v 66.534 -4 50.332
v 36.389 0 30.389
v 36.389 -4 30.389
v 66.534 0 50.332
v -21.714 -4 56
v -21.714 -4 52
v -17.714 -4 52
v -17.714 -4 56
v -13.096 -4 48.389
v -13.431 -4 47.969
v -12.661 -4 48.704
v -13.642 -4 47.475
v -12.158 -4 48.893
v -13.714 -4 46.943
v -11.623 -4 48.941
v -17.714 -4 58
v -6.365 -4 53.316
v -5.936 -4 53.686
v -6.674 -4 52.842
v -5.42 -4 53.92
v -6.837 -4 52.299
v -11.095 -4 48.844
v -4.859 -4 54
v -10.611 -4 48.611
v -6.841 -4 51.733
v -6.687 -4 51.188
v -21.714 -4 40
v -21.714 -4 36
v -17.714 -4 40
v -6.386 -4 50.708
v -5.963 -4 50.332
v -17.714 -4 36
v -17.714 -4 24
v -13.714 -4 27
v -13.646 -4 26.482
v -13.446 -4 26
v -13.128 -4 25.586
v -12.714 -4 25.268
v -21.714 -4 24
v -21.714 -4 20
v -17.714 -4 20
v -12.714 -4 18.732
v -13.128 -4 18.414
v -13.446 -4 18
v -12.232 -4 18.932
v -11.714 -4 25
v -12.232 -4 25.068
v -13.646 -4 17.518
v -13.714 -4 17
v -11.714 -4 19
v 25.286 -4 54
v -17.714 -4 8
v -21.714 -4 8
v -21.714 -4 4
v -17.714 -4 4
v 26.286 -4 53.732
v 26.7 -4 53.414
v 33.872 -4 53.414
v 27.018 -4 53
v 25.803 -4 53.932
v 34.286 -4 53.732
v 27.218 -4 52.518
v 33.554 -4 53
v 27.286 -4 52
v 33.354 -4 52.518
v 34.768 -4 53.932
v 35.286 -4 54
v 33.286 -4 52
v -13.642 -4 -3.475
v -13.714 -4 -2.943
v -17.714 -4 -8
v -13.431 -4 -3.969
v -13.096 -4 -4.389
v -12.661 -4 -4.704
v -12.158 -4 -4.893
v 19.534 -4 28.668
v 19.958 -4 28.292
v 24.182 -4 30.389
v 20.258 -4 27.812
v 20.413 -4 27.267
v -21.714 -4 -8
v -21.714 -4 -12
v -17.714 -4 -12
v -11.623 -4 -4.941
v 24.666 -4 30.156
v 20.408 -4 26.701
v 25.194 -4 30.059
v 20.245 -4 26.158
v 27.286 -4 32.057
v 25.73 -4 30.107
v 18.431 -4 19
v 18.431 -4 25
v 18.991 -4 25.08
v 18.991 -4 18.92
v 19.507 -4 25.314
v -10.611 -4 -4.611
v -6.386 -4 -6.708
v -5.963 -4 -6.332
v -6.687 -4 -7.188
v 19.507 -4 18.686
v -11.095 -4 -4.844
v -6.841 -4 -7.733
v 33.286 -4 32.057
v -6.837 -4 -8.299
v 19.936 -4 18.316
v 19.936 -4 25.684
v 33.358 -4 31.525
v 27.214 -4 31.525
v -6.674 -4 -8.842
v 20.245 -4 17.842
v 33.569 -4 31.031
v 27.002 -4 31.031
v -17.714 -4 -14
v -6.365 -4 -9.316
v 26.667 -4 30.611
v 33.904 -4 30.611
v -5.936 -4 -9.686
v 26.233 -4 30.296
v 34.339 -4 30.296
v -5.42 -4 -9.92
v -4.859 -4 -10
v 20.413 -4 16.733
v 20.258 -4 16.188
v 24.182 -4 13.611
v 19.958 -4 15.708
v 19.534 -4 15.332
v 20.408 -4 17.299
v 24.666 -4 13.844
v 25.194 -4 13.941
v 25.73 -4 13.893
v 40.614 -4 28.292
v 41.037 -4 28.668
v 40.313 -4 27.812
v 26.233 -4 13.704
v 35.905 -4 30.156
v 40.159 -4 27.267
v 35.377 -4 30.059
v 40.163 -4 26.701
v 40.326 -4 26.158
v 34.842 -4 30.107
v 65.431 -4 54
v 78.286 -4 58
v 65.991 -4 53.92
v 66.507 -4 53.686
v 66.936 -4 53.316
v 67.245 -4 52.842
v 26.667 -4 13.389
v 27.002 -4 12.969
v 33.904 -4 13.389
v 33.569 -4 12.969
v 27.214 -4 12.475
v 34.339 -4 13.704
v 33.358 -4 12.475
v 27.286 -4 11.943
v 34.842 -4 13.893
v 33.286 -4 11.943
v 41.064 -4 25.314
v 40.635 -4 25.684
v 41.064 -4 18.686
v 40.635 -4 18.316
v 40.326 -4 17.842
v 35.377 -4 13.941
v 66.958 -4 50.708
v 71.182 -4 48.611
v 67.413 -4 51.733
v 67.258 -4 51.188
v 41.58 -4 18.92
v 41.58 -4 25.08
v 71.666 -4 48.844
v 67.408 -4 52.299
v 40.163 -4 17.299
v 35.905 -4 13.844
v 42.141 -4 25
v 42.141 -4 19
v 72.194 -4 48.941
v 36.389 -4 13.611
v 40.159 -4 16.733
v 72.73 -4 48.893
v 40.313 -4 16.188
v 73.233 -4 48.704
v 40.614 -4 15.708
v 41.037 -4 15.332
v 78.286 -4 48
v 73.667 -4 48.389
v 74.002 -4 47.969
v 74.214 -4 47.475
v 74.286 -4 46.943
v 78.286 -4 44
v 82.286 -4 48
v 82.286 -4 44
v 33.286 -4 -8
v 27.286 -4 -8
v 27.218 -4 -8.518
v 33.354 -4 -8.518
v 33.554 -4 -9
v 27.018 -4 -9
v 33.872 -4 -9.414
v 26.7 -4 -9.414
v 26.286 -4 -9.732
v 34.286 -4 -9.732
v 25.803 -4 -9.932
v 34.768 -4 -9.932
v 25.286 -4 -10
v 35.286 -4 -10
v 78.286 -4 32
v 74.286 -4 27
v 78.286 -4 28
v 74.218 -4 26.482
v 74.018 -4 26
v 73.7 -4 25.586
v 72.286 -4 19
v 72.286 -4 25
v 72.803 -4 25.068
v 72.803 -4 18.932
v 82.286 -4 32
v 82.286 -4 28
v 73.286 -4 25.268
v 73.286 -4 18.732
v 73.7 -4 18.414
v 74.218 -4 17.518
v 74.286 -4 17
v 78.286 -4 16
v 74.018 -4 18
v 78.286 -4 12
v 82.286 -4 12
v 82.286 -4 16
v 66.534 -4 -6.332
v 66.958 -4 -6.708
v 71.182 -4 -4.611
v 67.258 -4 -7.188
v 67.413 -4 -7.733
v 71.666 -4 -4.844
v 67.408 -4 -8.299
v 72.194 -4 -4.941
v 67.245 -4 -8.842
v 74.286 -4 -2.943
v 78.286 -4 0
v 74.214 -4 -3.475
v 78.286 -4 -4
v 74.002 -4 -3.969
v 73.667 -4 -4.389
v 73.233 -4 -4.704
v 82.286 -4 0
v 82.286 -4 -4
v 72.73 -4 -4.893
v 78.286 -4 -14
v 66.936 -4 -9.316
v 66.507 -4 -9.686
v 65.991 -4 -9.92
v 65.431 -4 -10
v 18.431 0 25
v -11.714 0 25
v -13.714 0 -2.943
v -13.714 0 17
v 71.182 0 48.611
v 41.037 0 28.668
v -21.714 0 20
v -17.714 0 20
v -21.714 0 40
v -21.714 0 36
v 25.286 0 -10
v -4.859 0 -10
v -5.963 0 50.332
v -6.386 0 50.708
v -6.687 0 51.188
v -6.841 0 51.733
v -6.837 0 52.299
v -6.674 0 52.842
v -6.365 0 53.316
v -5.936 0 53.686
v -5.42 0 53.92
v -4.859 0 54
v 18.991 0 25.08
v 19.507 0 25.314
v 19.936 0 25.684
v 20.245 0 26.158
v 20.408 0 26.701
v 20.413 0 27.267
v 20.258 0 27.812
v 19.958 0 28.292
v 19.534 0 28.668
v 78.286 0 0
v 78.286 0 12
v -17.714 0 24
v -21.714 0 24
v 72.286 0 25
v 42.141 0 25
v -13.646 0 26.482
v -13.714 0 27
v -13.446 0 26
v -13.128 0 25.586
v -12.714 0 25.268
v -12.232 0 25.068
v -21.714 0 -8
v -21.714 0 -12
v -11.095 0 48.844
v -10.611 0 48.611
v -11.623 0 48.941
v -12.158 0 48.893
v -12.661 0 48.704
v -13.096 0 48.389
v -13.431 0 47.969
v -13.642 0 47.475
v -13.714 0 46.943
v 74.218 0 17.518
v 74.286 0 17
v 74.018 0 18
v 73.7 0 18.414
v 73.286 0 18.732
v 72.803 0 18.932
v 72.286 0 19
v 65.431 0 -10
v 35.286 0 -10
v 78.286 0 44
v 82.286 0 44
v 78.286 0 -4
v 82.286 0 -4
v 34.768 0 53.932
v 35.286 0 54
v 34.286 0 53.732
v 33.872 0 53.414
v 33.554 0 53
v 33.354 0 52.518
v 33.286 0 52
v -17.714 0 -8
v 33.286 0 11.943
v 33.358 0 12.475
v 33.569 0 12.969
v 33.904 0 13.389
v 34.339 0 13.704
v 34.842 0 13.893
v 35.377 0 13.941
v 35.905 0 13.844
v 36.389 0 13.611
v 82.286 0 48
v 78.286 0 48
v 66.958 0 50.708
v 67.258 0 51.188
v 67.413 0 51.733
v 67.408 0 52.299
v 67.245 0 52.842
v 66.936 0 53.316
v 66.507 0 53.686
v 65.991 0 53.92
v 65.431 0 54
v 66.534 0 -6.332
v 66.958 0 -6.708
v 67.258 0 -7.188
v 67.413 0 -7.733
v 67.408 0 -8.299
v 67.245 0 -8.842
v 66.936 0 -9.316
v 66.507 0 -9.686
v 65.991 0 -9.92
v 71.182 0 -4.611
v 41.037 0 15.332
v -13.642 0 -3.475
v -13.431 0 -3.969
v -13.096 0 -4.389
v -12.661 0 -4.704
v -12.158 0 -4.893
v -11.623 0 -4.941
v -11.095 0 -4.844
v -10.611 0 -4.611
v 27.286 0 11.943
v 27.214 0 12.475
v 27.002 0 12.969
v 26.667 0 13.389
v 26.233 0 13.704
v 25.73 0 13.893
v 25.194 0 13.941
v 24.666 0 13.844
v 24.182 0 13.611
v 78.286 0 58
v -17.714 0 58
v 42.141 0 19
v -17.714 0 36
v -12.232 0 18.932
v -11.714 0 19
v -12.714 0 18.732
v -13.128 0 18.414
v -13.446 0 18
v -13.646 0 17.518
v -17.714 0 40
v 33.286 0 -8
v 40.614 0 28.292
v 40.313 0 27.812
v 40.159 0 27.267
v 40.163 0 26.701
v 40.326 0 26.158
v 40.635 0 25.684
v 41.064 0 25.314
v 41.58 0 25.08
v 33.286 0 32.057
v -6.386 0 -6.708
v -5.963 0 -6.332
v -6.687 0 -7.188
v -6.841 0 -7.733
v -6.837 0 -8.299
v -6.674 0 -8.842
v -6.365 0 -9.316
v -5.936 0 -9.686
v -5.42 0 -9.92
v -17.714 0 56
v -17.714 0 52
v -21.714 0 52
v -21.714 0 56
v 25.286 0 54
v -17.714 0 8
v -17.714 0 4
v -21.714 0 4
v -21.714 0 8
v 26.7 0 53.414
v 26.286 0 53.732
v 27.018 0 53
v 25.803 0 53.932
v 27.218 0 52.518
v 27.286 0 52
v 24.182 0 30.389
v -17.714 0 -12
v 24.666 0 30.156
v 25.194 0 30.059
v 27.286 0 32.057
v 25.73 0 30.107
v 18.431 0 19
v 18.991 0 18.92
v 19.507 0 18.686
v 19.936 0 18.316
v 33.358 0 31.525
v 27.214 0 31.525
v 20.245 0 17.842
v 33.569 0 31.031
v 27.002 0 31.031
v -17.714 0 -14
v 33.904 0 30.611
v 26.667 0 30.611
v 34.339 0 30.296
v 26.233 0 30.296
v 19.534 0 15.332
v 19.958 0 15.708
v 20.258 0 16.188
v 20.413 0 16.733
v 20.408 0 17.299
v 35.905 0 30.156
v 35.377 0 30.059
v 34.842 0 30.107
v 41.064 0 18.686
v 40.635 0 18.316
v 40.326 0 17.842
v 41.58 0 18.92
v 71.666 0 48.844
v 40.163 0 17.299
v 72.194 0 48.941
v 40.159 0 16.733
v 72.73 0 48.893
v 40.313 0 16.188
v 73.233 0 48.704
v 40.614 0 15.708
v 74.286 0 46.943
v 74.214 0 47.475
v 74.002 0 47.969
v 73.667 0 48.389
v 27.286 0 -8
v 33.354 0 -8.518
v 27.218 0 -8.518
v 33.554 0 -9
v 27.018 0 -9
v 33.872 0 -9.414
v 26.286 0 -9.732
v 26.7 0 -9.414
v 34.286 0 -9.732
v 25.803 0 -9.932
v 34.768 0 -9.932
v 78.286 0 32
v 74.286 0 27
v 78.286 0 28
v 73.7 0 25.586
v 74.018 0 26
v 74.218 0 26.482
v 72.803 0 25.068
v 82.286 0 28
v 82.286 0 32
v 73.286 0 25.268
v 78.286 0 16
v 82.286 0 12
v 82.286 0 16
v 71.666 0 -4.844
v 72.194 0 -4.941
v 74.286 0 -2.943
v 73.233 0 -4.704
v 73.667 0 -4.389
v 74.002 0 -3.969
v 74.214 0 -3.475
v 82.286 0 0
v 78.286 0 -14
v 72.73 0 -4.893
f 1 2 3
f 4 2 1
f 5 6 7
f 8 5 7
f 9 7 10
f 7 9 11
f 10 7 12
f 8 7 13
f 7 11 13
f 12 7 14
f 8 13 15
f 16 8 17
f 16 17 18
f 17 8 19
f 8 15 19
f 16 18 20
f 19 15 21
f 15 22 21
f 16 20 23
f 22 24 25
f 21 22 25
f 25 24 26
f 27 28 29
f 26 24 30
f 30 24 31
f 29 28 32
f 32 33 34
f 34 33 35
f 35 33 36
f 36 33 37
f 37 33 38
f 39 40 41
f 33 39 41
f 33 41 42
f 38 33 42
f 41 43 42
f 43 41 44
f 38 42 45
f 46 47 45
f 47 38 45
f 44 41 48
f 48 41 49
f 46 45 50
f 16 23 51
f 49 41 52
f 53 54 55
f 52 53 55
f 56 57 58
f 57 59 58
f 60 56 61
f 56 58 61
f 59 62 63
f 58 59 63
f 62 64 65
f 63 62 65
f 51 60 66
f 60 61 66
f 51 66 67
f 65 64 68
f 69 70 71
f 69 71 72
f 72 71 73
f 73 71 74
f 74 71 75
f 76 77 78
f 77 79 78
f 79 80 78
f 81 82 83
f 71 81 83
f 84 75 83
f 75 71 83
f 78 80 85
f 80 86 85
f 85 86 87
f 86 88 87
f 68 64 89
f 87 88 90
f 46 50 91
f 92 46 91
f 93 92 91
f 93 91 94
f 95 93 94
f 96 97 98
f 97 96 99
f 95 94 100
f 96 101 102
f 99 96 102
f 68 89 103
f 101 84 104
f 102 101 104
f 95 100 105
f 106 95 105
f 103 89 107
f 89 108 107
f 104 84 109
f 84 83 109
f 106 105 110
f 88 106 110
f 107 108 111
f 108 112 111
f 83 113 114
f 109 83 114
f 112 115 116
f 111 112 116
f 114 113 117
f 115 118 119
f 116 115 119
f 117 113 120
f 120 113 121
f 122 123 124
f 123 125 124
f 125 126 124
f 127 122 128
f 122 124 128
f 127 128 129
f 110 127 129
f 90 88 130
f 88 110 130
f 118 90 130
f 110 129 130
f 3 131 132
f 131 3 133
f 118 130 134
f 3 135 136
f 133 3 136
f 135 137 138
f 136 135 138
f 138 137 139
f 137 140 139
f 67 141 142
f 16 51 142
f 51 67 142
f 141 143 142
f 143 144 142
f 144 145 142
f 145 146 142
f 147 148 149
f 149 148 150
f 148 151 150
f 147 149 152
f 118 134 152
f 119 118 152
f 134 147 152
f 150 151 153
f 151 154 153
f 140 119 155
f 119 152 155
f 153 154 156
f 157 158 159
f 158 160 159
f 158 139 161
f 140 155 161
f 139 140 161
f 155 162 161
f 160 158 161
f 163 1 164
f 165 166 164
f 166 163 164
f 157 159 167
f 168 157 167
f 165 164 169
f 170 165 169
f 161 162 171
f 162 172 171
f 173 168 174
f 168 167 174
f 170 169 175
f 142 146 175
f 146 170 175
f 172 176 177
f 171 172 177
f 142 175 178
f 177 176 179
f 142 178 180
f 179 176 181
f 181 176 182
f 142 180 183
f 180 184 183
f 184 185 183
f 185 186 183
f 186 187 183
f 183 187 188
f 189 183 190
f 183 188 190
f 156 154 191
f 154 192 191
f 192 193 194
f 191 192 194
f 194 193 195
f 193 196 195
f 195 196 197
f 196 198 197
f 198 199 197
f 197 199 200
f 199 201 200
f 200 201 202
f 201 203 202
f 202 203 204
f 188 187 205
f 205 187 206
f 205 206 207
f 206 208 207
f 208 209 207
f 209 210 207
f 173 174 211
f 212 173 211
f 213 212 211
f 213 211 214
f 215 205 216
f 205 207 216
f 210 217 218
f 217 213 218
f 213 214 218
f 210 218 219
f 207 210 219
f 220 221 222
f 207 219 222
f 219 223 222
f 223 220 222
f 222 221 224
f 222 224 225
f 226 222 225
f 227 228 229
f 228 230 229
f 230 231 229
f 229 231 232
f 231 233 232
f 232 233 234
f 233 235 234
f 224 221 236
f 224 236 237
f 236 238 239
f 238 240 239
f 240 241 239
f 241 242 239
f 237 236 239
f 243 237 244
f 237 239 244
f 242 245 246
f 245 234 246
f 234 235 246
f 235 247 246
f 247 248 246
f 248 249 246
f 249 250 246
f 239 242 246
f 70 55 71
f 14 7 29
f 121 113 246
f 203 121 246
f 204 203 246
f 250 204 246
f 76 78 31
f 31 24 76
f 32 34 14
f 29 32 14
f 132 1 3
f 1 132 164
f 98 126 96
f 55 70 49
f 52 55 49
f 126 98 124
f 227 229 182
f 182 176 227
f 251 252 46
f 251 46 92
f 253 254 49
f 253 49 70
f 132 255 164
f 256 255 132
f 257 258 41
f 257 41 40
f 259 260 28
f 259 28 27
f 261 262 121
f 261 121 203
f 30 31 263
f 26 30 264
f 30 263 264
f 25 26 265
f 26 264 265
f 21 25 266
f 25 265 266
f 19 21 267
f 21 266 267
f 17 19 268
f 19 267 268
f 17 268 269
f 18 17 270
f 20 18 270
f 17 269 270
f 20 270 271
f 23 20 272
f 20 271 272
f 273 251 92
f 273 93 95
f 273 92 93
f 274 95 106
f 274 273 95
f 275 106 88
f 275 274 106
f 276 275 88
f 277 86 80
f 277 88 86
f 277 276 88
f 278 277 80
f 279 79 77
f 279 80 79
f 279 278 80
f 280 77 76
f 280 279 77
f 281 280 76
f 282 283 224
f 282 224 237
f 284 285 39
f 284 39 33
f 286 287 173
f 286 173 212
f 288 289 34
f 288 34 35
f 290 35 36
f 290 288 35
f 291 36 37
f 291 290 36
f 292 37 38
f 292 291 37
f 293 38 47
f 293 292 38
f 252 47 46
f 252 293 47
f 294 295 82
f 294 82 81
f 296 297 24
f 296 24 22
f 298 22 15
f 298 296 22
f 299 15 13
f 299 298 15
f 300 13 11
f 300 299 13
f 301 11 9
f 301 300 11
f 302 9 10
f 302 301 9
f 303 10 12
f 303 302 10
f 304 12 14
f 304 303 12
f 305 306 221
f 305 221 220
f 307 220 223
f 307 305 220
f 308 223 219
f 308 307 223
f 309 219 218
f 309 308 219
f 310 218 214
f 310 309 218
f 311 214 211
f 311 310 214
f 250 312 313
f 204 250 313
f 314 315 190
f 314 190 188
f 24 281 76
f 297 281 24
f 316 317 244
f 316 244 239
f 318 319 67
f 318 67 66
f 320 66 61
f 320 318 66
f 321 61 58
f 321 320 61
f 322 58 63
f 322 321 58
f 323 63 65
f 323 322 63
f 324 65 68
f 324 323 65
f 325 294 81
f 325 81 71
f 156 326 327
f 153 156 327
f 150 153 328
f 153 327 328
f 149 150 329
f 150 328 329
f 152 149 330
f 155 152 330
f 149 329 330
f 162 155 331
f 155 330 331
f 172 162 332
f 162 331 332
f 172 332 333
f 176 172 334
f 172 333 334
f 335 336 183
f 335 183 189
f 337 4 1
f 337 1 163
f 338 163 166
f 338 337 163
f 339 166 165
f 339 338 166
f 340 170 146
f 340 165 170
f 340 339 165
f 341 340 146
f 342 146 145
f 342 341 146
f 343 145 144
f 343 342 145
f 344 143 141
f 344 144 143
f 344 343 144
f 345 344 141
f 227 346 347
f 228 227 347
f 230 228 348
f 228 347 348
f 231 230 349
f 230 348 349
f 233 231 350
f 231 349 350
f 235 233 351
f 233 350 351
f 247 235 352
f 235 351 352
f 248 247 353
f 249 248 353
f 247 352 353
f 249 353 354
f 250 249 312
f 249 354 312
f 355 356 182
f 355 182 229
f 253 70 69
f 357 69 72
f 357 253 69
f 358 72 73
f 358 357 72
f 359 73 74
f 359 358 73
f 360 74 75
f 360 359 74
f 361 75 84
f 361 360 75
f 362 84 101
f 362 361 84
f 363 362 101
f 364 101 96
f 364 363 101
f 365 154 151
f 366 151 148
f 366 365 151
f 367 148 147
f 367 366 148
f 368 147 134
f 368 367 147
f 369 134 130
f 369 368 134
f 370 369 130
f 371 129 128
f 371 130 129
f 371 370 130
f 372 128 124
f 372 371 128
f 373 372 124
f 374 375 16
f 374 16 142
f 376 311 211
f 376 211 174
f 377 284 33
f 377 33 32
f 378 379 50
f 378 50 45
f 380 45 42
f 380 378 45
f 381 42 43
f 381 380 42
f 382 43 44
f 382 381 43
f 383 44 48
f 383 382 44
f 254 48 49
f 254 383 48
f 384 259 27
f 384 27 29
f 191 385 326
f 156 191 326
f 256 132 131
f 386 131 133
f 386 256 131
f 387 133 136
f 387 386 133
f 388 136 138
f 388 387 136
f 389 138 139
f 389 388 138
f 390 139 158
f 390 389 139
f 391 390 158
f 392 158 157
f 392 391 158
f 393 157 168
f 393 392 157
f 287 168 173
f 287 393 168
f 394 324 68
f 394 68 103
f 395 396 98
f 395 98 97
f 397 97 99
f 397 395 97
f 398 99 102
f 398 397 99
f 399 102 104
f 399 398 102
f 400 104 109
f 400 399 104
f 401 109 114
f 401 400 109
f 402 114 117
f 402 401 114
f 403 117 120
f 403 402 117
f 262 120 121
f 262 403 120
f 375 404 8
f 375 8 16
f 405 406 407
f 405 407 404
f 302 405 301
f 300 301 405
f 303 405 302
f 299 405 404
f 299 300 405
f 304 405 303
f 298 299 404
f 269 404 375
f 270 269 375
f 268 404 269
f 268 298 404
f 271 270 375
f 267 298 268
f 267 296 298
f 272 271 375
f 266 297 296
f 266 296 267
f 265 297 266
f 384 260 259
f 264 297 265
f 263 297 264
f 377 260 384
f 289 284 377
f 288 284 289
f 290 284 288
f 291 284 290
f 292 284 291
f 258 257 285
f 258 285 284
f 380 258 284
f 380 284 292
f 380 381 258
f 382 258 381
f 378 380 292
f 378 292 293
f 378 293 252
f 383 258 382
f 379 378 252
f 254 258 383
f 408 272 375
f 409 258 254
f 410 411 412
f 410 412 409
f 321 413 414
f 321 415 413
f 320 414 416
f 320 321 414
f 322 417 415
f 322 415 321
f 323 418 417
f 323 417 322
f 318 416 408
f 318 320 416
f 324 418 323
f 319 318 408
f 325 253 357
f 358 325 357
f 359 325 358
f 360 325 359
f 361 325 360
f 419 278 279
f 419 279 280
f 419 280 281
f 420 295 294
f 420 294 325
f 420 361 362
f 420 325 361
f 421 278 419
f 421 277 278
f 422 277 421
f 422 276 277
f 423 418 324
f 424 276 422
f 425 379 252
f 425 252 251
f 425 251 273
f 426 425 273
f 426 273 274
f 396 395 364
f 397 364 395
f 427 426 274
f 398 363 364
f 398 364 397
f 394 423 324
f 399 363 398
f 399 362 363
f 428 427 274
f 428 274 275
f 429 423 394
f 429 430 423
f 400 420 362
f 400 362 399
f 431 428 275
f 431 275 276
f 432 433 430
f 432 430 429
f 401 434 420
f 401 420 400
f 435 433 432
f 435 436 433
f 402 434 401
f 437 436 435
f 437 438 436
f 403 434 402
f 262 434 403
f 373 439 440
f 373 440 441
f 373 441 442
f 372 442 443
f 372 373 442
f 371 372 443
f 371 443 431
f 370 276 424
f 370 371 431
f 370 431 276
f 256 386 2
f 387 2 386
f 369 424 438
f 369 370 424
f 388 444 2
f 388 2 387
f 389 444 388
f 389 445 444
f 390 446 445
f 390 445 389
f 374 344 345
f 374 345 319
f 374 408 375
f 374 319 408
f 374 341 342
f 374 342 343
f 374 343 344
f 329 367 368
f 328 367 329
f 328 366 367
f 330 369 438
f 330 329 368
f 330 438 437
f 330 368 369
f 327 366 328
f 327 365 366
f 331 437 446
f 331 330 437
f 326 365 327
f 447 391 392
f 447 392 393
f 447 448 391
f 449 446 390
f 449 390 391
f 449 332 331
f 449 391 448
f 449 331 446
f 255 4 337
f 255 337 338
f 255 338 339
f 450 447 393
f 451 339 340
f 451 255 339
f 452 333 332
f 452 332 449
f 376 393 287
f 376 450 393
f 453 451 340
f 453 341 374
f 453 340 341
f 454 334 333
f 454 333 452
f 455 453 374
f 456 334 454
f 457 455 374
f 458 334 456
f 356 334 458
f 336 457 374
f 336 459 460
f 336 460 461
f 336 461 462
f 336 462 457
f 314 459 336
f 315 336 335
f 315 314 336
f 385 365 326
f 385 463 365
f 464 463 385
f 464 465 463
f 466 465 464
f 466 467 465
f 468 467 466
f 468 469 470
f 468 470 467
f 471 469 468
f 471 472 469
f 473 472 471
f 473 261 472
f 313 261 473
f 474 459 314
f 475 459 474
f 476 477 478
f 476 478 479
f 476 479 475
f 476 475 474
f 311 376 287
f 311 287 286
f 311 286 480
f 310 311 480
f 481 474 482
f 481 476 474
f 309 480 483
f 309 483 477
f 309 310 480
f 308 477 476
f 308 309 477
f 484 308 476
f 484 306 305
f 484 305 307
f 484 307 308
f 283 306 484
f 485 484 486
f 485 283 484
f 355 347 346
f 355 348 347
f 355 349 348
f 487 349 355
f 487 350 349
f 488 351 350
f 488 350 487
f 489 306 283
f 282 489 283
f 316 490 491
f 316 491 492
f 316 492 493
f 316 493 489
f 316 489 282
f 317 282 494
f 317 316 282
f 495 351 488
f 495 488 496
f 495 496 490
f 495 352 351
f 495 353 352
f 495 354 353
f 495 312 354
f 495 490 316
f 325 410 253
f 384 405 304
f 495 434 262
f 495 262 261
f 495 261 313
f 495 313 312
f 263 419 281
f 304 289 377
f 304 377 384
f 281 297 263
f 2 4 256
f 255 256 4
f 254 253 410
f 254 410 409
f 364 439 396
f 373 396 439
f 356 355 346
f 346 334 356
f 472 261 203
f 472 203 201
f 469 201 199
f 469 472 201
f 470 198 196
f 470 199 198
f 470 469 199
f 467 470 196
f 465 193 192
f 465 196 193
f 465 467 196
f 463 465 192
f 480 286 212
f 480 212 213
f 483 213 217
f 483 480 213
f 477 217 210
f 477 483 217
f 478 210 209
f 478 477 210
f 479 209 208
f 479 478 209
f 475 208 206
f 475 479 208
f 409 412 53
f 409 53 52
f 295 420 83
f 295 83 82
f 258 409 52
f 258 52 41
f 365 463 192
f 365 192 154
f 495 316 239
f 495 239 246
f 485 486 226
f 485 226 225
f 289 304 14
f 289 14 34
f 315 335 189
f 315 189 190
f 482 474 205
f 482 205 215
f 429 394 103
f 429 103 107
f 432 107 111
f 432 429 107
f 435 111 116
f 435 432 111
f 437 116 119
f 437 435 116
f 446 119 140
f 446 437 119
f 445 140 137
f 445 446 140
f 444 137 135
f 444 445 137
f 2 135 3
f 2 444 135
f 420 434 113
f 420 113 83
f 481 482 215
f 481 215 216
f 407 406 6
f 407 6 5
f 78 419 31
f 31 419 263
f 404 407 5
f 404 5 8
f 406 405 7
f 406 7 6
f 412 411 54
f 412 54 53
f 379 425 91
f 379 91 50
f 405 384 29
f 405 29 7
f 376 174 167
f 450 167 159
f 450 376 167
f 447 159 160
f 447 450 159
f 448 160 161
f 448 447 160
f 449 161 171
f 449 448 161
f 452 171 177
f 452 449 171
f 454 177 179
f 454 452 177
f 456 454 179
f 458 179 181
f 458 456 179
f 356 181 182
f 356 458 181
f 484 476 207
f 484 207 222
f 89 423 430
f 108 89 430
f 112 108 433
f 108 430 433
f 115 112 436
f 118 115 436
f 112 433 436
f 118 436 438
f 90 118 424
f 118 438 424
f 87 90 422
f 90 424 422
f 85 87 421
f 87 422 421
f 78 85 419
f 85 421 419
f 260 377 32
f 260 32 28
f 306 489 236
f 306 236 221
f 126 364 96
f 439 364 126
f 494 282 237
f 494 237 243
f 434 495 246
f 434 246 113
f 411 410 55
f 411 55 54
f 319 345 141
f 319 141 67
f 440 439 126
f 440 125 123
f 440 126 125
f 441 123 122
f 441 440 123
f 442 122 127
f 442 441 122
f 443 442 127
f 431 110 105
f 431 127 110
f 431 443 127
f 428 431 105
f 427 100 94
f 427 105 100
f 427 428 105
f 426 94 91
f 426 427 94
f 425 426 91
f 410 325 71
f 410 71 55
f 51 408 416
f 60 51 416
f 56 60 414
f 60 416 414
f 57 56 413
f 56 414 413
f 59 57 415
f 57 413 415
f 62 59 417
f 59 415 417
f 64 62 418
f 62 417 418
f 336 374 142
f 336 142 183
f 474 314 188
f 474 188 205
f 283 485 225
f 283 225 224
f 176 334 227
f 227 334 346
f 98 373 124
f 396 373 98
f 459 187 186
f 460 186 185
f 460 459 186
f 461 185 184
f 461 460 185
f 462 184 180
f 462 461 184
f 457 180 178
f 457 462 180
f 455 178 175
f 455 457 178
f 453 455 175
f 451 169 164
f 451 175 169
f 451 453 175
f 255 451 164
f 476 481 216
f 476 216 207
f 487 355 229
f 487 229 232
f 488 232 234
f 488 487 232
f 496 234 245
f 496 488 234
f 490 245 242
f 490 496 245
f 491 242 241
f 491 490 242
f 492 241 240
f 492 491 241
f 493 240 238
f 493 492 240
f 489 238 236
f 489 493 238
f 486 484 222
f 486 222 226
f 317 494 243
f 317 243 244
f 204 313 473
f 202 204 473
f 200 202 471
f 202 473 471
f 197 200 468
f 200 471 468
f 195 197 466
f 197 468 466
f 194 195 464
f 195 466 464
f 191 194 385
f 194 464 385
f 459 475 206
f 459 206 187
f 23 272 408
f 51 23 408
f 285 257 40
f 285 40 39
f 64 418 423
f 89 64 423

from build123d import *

# Parameters (mm, degrees)
BOSS_EXTRUDE1_DEPTH = 4
CUT_EXTRUDE1_DEPTH  = 10


with BuildPart() as part:
    # Sketch1 → Boss-Extrude1 (new body)
    with BuildSketch(Plane(origin=(0, 0, 0), x_dir=(1, 0, 0), z_dir=(0, 1, 0))):
        Polygon((-17.714285714, 14), (-17.714285714, 12), (-21.714285714, 12), (-21.714285714, 8), (-17.714285714, 8), (-17.714285714, -4), (-21.714285714, -4), (-21.714285714, -8), (-17.714285714, -8), (-17.714285714, -20), (-21.714285714, -20), (-21.714285714, -24), (-17.714285714, -24), (-17.714285714, -36), (-21.714285714, -36), (-21.714285714, -40), (-17.714285714, -40), (-17.714285714, -52), (-21.714285714, -52), (-21.714285714, -56), (-17.714285714, -56), (-17.714285714, -58), (78.285714286, -58), (78.285714286, -48), (82.285714286, -48), (82.285714286, -44), (78.285714286, -44), (78.285714286, -32), (82.285714286, -32), (82.285714286, -28), (78.285714286, -28), (78.285714286, -16), (82.285714286, -16), (82.285714286, -12), (78.285714286, -12), (78.285714286, 0), (82.285714286, 0), (82.285714286, 4), (78.285714286, 4), (78.285714286, 14), align=None)
    extrude(amount=-BOSS_EXTRUDE1_DEPTH)

    # Sketch2 → Cut-Extrude1 (cut)
    with BuildSketch(Plane(origin=(0, 0, 0), x_dir=(1, 0, 0), z_dir=(0, 1, 0))):
        with BuildLine():
            Line((-4.859302854, 10), (25.285714286, 10))
            ThreePointArc((25.285714286, 10), (26.699927848, 9.414213562), (27.285714286, 8))
            Line((27.285714286, 8), (27.285714286, -11.94278394))
            ThreePointArc((27.285714286, -11.94278394), (26.23255212, -13.704458744), (24.182216171, -13.610804297))
            Line((24.182216171, -13.610804297), (-5.962800969, 6.331979643))
            ThreePointArc((-5.962800969, 6.331979643), (-6.774510508, 8.576176746), (-4.859302854, 10))
        make_face()
        with BuildLine():
            Line((33.285714286, 8), (33.285714286, -11.94278394))
            ThreePointArc((33.285714286, -11.94278394), (34.338876451, -13.704458744), (36.3892124, -13.610804297))
            Line((36.3892124, -13.610804297), (66.53422954, 6.331979643))
            ThreePointArc((66.53422954, 6.331979643), (67.345939079, 8.576176746), (65.430731426, 10))
            Line((65.430731426, 10), (35.285714286, 10))
            ThreePointArc((35.285714286, 10), (33.871500723, 9.414213562), (33.285714286, 8))
        make_face()
        with BuildLine():
            ThreePointArc((74.285714286, -17), (73.699927848, -18.414213562), (72.285714286, -19))
            Line((72.285714286, -19), (42.140697146, -19))
            ThreePointArc((42.140697146, -19), (40.225489492, -17.576176746), (41.037199031, -15.331979643))
            Line((41.037199031, -15.331979643), (71.182216171, 4.610804297))
            ThreePointArc((71.182216171, 4.610804297), (73.23255212, 4.704458744), (74.285714286, 2.94278394))
            Line((74.285714286, 2.94278394), (74.285714286, -17))
        make_face()
        with BuildLine():
            ThreePointArc((74.285714286, -46.94278394), (73.23255212, -48.704458744), (71.182216171, -48.610804297))
            Line((71.182216171, -48.610804297), (41.037199031, -28.668020357))
            ThreePointArc((41.037199031, -28.668020357), (40.225489492, -26.423823254), (42.140697146, -25))
            Line((42.140697146, -25), (72.285714286, -25))
            ThreePointArc((72.285714286, -25), (73.699927848, -25.585786438), (74.285714286, -27))
            Line((74.285714286, -27), (74.285714286, -46.94278394))
        make_face()
        with BuildLine():
            Line((65.430731426, -54), (35.285714286, -54))
            ThreePointArc((35.285714286, -54), (33.871500723, -53.414213562), (33.285714286, -52))
            Line((33.285714286, -52), (33.285714286, -32.05721606))
            ThreePointArc((33.285714286, -32.05721606), (34.338876451, -30.295541256), (36.3892124, -30.389195703))
            Line((36.3892124, -30.389195703), (66.53422954, -50.331979643))
            ThreePointArc((66.53422954, -50.331979643), (67.345939079, -52.576176746), (65.430731426, -54))
        make_face()
        with BuildLine():
            Line((27.285714286, -52), (27.285714286, -32.05721606))
            ThreePointArc((27.285714286, -32.05721606), (26.23255212, -30.295541256), (24.182216171, -30.389195703))
            Line((24.182216171, -30.389195703), (-5.962800969, -50.331979643))
            ThreePointArc((-5.962800969, -50.331979643), (-6.774510508, -52.576176746), (-4.859302854, -54))
            Line((-4.859302854, -54), (25.285714286, -54))
            ThreePointArc((25.285714286, -54), (26.699927848, -53.414213562), (27.285714286, -52))
        make_face()
        with BuildLine():
            ThreePointArc((-13.714285714, -27), (-13.128499277, -25.585786438), (-11.714285714, -25))
            Line((-11.714285714, -25), (18.430731426, -25))
            ThreePointArc((18.430731426, -25), (20.345939079, -26.423823254), (19.53422954, -28.668020357))
            Line((19.53422954, -28.668020357), (-10.6107876, -48.610804297))
            ThreePointArc((-10.6107876, -48.610804297), (-12.661123549, -48.704458744), (-13.714285714, -46.94278394))
            Line((-13.714285714, -46.94278394), (-13.714285714, -27))
        make_face()
        with BuildLine():
            ThreePointArc((-13.714285714, 2.94278394), (-12.661123549, 4.704458744), (-10.6107876, 4.610804297))
            Line((-10.6107876, 4.610804297), (19.53422954, -15.331979643))
            ThreePointArc((19.53422954, -15.331979643), (20.345939079, -17.576176746), (18.430731426, -19))
            Line((18.430731426, -19), (-11.714285714, -19))
            ThreePointArc((-11.714285714, -19), (-13.128499277, -18.414213562), (-13.714285714, -17))
            Line((-13.714285714, -17), (-13.714285714, 2.94278394))
        make_face()
    extrude(amount=-CUT_EXTRUDE1_DEPTH, mode=Mode.SUBTRACT)


solid = part.part
